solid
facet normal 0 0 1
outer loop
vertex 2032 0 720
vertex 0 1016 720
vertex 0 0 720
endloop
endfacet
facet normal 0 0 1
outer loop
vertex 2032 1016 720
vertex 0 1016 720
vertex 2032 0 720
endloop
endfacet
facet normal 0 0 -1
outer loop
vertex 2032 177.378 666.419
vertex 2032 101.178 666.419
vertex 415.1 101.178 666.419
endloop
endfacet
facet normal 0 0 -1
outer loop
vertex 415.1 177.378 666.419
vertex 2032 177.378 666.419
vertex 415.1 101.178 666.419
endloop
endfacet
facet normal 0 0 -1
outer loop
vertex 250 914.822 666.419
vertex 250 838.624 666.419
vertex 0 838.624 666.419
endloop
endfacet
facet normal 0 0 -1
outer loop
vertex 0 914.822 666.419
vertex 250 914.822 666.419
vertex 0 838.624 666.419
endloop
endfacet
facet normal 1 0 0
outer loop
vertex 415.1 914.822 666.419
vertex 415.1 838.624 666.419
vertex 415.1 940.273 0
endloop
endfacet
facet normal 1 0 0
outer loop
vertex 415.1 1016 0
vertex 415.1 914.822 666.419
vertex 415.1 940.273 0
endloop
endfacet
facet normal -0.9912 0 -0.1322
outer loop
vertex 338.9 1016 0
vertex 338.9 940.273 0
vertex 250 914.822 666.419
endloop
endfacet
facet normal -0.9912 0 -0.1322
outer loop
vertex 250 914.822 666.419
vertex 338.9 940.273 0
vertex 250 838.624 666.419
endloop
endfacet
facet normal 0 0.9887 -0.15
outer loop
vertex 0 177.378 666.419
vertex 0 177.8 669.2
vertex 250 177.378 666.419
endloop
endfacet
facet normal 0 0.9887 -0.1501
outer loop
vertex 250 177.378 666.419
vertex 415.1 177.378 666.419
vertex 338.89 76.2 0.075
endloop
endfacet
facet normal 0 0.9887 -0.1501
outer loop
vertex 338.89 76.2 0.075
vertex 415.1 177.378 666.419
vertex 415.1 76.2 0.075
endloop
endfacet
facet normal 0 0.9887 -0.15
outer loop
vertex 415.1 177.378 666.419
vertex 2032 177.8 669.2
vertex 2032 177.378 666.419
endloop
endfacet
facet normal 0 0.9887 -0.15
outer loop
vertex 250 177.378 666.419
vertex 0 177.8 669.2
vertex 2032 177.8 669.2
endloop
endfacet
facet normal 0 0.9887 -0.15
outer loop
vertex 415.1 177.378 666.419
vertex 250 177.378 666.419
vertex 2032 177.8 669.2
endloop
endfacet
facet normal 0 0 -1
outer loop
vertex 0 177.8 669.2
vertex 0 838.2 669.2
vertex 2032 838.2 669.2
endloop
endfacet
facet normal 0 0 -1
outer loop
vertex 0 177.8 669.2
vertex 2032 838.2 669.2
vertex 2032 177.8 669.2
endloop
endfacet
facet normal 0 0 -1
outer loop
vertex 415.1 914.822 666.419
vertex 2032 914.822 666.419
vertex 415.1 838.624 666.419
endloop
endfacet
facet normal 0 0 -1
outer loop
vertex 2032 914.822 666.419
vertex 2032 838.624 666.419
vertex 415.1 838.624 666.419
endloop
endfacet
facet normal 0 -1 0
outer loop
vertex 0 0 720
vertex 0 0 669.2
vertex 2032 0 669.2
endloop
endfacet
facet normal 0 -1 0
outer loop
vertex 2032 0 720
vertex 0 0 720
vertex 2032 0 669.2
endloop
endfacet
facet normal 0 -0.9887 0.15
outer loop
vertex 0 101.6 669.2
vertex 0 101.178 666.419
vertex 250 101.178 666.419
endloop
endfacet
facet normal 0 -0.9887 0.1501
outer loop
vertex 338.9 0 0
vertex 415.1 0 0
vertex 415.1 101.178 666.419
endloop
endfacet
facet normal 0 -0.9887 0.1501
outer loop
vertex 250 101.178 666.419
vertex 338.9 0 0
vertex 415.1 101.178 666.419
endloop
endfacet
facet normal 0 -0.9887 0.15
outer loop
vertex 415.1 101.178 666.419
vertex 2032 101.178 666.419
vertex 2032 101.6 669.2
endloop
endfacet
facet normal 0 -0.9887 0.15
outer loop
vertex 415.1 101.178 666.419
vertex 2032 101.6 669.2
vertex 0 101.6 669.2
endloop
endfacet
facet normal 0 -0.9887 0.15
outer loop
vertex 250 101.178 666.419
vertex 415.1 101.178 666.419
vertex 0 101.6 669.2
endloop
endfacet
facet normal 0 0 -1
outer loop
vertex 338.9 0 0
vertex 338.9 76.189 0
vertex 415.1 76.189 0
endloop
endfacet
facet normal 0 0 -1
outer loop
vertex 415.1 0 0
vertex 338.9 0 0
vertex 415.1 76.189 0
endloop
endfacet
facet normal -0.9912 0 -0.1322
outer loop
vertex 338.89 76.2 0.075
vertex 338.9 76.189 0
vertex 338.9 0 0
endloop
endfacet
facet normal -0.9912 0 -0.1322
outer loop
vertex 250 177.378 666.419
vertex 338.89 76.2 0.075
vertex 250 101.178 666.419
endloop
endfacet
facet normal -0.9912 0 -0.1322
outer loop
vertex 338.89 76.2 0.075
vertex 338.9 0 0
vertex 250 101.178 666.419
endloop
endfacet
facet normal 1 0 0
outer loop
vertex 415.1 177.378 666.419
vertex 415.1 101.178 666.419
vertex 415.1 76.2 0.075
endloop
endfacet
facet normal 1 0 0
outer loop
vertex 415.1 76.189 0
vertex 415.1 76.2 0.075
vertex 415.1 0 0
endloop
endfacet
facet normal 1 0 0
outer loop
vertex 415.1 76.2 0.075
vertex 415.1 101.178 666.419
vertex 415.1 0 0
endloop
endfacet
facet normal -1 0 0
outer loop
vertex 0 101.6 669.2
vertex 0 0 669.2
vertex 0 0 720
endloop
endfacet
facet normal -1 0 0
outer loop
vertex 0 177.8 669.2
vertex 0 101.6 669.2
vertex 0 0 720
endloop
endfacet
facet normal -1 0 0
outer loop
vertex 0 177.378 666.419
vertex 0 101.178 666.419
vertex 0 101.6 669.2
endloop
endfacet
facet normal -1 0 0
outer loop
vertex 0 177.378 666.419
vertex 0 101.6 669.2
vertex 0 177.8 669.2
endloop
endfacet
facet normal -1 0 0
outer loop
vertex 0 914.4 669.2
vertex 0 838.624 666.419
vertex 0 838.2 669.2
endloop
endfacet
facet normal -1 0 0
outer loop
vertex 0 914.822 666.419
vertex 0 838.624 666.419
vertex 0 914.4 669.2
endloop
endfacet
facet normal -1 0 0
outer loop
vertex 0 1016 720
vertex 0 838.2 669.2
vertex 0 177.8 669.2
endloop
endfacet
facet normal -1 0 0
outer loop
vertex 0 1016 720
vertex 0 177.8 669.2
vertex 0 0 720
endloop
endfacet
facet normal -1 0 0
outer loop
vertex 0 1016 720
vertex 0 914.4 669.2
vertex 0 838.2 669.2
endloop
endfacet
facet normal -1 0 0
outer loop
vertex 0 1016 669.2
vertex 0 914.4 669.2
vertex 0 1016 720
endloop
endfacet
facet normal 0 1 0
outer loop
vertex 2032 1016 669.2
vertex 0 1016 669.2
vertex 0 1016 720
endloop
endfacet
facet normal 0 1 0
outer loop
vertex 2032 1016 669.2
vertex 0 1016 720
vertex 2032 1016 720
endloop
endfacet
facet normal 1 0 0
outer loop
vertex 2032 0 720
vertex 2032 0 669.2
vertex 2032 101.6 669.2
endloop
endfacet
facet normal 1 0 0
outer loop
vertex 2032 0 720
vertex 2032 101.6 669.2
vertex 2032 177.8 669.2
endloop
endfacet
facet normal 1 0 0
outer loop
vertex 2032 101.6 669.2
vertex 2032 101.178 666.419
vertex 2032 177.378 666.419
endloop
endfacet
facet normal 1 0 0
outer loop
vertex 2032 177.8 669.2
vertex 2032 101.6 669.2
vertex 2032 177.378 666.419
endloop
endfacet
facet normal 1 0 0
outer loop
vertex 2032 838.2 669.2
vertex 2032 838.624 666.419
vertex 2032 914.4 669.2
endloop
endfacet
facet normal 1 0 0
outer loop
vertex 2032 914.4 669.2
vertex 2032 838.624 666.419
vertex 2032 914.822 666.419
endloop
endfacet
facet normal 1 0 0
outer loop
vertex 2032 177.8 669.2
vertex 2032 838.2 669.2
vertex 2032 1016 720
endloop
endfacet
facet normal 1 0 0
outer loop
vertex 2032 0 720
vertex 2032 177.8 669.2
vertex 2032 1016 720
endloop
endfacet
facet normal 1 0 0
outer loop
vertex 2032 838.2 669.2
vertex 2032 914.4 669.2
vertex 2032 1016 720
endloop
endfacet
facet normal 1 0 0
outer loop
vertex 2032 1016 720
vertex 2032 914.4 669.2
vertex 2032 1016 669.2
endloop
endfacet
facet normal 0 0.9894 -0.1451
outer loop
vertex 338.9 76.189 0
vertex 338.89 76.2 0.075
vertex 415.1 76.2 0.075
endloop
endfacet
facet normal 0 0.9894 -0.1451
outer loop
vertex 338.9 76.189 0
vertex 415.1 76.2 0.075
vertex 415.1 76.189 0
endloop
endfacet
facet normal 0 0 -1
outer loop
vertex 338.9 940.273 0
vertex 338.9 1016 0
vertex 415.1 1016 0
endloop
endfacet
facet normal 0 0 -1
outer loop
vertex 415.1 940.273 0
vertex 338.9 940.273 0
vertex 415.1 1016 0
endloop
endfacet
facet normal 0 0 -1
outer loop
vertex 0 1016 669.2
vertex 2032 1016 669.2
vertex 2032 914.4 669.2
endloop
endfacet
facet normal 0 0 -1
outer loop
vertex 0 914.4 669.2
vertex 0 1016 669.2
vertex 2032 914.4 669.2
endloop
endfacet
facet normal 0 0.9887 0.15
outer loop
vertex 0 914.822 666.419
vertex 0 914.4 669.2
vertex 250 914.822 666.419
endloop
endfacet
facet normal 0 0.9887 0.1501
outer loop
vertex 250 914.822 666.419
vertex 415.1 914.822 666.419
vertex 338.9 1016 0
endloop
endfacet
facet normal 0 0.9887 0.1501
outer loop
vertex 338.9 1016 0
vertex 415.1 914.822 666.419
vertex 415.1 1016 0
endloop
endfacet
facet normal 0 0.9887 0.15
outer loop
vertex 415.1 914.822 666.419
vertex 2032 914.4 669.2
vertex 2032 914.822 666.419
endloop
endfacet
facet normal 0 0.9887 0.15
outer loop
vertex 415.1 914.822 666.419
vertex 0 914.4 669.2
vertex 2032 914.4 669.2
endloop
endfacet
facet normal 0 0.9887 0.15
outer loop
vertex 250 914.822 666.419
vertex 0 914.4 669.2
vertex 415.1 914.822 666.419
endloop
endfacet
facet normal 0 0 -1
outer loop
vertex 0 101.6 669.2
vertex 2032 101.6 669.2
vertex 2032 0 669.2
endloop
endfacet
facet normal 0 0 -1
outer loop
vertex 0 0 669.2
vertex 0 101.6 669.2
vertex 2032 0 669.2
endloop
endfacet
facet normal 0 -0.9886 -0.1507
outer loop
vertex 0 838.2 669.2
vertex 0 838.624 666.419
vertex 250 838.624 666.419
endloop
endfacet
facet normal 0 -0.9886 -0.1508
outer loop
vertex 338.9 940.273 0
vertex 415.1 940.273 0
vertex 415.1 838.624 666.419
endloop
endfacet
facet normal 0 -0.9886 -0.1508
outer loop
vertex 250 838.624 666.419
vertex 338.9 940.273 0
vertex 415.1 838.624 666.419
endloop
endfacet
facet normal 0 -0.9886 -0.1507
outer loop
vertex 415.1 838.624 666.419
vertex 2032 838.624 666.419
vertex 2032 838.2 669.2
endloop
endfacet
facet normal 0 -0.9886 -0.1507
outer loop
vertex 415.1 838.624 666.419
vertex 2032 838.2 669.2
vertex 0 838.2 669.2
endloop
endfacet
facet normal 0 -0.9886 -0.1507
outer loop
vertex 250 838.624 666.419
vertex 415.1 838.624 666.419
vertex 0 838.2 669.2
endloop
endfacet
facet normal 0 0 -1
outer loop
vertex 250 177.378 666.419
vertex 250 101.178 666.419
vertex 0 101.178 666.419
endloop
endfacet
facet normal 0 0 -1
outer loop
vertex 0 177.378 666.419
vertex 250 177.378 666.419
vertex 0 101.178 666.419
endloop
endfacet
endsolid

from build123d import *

# Parameters (mm, degrees)
F0_W     = 2032
F0_H     = 1016
F1_DEPTH = 720
F3_DEPTH = 3810
F5_DEPTH = 1143


with BuildPart() as f1:
    # F0 (on Top) → F1 (new body)
    with BuildSketch(Plane.XY):
        with Locations((1016, 508)):
            Rectangle(F0_W, F0_H)
    extrude(amount=F1_DEPTH)

    # F2 (on face) → F3 (cut)
    with BuildSketch(Plane.YZ.offset(2032)):
        Polygon((76.199963, 0.074586), (76.188638, 0), (101.6, 0), (924.743533, 0), (940.272614, 0), (838.2, 669.2), (177.8, 669.2), align=None)
        Polygon((101.6, 669.2), (0, 669.2), (0, 0), align=None)
        Polygon((1016, 0), (1016, 669.2), (914.4, 669.2), align=None)
    extrude(amount=-F3_DEPTH, mode=Mode.SUBTRACT)

    # F4 (on Front) → F5 (cut)
    with BuildSketch(Plane.XZ):
        Polygon((415.1, 0), (2584.981293, 0), (2584.981301, 666.419255), (415.1, 666.419255), align=None)
        Polygon((250, 666.419255), (0, 666.419255), (0, 0), (338.9, 0), align=None)
        Polygon((3000.081301, 0), (3000.081301, 666.419255), (2750.081301, 666.419255), (2661.181293, 0), (2740.58795, 0), align=None)
    extrude(amount=-F5_DEPTH, mode=Mode.SUBTRACT)


solid = f1.part
